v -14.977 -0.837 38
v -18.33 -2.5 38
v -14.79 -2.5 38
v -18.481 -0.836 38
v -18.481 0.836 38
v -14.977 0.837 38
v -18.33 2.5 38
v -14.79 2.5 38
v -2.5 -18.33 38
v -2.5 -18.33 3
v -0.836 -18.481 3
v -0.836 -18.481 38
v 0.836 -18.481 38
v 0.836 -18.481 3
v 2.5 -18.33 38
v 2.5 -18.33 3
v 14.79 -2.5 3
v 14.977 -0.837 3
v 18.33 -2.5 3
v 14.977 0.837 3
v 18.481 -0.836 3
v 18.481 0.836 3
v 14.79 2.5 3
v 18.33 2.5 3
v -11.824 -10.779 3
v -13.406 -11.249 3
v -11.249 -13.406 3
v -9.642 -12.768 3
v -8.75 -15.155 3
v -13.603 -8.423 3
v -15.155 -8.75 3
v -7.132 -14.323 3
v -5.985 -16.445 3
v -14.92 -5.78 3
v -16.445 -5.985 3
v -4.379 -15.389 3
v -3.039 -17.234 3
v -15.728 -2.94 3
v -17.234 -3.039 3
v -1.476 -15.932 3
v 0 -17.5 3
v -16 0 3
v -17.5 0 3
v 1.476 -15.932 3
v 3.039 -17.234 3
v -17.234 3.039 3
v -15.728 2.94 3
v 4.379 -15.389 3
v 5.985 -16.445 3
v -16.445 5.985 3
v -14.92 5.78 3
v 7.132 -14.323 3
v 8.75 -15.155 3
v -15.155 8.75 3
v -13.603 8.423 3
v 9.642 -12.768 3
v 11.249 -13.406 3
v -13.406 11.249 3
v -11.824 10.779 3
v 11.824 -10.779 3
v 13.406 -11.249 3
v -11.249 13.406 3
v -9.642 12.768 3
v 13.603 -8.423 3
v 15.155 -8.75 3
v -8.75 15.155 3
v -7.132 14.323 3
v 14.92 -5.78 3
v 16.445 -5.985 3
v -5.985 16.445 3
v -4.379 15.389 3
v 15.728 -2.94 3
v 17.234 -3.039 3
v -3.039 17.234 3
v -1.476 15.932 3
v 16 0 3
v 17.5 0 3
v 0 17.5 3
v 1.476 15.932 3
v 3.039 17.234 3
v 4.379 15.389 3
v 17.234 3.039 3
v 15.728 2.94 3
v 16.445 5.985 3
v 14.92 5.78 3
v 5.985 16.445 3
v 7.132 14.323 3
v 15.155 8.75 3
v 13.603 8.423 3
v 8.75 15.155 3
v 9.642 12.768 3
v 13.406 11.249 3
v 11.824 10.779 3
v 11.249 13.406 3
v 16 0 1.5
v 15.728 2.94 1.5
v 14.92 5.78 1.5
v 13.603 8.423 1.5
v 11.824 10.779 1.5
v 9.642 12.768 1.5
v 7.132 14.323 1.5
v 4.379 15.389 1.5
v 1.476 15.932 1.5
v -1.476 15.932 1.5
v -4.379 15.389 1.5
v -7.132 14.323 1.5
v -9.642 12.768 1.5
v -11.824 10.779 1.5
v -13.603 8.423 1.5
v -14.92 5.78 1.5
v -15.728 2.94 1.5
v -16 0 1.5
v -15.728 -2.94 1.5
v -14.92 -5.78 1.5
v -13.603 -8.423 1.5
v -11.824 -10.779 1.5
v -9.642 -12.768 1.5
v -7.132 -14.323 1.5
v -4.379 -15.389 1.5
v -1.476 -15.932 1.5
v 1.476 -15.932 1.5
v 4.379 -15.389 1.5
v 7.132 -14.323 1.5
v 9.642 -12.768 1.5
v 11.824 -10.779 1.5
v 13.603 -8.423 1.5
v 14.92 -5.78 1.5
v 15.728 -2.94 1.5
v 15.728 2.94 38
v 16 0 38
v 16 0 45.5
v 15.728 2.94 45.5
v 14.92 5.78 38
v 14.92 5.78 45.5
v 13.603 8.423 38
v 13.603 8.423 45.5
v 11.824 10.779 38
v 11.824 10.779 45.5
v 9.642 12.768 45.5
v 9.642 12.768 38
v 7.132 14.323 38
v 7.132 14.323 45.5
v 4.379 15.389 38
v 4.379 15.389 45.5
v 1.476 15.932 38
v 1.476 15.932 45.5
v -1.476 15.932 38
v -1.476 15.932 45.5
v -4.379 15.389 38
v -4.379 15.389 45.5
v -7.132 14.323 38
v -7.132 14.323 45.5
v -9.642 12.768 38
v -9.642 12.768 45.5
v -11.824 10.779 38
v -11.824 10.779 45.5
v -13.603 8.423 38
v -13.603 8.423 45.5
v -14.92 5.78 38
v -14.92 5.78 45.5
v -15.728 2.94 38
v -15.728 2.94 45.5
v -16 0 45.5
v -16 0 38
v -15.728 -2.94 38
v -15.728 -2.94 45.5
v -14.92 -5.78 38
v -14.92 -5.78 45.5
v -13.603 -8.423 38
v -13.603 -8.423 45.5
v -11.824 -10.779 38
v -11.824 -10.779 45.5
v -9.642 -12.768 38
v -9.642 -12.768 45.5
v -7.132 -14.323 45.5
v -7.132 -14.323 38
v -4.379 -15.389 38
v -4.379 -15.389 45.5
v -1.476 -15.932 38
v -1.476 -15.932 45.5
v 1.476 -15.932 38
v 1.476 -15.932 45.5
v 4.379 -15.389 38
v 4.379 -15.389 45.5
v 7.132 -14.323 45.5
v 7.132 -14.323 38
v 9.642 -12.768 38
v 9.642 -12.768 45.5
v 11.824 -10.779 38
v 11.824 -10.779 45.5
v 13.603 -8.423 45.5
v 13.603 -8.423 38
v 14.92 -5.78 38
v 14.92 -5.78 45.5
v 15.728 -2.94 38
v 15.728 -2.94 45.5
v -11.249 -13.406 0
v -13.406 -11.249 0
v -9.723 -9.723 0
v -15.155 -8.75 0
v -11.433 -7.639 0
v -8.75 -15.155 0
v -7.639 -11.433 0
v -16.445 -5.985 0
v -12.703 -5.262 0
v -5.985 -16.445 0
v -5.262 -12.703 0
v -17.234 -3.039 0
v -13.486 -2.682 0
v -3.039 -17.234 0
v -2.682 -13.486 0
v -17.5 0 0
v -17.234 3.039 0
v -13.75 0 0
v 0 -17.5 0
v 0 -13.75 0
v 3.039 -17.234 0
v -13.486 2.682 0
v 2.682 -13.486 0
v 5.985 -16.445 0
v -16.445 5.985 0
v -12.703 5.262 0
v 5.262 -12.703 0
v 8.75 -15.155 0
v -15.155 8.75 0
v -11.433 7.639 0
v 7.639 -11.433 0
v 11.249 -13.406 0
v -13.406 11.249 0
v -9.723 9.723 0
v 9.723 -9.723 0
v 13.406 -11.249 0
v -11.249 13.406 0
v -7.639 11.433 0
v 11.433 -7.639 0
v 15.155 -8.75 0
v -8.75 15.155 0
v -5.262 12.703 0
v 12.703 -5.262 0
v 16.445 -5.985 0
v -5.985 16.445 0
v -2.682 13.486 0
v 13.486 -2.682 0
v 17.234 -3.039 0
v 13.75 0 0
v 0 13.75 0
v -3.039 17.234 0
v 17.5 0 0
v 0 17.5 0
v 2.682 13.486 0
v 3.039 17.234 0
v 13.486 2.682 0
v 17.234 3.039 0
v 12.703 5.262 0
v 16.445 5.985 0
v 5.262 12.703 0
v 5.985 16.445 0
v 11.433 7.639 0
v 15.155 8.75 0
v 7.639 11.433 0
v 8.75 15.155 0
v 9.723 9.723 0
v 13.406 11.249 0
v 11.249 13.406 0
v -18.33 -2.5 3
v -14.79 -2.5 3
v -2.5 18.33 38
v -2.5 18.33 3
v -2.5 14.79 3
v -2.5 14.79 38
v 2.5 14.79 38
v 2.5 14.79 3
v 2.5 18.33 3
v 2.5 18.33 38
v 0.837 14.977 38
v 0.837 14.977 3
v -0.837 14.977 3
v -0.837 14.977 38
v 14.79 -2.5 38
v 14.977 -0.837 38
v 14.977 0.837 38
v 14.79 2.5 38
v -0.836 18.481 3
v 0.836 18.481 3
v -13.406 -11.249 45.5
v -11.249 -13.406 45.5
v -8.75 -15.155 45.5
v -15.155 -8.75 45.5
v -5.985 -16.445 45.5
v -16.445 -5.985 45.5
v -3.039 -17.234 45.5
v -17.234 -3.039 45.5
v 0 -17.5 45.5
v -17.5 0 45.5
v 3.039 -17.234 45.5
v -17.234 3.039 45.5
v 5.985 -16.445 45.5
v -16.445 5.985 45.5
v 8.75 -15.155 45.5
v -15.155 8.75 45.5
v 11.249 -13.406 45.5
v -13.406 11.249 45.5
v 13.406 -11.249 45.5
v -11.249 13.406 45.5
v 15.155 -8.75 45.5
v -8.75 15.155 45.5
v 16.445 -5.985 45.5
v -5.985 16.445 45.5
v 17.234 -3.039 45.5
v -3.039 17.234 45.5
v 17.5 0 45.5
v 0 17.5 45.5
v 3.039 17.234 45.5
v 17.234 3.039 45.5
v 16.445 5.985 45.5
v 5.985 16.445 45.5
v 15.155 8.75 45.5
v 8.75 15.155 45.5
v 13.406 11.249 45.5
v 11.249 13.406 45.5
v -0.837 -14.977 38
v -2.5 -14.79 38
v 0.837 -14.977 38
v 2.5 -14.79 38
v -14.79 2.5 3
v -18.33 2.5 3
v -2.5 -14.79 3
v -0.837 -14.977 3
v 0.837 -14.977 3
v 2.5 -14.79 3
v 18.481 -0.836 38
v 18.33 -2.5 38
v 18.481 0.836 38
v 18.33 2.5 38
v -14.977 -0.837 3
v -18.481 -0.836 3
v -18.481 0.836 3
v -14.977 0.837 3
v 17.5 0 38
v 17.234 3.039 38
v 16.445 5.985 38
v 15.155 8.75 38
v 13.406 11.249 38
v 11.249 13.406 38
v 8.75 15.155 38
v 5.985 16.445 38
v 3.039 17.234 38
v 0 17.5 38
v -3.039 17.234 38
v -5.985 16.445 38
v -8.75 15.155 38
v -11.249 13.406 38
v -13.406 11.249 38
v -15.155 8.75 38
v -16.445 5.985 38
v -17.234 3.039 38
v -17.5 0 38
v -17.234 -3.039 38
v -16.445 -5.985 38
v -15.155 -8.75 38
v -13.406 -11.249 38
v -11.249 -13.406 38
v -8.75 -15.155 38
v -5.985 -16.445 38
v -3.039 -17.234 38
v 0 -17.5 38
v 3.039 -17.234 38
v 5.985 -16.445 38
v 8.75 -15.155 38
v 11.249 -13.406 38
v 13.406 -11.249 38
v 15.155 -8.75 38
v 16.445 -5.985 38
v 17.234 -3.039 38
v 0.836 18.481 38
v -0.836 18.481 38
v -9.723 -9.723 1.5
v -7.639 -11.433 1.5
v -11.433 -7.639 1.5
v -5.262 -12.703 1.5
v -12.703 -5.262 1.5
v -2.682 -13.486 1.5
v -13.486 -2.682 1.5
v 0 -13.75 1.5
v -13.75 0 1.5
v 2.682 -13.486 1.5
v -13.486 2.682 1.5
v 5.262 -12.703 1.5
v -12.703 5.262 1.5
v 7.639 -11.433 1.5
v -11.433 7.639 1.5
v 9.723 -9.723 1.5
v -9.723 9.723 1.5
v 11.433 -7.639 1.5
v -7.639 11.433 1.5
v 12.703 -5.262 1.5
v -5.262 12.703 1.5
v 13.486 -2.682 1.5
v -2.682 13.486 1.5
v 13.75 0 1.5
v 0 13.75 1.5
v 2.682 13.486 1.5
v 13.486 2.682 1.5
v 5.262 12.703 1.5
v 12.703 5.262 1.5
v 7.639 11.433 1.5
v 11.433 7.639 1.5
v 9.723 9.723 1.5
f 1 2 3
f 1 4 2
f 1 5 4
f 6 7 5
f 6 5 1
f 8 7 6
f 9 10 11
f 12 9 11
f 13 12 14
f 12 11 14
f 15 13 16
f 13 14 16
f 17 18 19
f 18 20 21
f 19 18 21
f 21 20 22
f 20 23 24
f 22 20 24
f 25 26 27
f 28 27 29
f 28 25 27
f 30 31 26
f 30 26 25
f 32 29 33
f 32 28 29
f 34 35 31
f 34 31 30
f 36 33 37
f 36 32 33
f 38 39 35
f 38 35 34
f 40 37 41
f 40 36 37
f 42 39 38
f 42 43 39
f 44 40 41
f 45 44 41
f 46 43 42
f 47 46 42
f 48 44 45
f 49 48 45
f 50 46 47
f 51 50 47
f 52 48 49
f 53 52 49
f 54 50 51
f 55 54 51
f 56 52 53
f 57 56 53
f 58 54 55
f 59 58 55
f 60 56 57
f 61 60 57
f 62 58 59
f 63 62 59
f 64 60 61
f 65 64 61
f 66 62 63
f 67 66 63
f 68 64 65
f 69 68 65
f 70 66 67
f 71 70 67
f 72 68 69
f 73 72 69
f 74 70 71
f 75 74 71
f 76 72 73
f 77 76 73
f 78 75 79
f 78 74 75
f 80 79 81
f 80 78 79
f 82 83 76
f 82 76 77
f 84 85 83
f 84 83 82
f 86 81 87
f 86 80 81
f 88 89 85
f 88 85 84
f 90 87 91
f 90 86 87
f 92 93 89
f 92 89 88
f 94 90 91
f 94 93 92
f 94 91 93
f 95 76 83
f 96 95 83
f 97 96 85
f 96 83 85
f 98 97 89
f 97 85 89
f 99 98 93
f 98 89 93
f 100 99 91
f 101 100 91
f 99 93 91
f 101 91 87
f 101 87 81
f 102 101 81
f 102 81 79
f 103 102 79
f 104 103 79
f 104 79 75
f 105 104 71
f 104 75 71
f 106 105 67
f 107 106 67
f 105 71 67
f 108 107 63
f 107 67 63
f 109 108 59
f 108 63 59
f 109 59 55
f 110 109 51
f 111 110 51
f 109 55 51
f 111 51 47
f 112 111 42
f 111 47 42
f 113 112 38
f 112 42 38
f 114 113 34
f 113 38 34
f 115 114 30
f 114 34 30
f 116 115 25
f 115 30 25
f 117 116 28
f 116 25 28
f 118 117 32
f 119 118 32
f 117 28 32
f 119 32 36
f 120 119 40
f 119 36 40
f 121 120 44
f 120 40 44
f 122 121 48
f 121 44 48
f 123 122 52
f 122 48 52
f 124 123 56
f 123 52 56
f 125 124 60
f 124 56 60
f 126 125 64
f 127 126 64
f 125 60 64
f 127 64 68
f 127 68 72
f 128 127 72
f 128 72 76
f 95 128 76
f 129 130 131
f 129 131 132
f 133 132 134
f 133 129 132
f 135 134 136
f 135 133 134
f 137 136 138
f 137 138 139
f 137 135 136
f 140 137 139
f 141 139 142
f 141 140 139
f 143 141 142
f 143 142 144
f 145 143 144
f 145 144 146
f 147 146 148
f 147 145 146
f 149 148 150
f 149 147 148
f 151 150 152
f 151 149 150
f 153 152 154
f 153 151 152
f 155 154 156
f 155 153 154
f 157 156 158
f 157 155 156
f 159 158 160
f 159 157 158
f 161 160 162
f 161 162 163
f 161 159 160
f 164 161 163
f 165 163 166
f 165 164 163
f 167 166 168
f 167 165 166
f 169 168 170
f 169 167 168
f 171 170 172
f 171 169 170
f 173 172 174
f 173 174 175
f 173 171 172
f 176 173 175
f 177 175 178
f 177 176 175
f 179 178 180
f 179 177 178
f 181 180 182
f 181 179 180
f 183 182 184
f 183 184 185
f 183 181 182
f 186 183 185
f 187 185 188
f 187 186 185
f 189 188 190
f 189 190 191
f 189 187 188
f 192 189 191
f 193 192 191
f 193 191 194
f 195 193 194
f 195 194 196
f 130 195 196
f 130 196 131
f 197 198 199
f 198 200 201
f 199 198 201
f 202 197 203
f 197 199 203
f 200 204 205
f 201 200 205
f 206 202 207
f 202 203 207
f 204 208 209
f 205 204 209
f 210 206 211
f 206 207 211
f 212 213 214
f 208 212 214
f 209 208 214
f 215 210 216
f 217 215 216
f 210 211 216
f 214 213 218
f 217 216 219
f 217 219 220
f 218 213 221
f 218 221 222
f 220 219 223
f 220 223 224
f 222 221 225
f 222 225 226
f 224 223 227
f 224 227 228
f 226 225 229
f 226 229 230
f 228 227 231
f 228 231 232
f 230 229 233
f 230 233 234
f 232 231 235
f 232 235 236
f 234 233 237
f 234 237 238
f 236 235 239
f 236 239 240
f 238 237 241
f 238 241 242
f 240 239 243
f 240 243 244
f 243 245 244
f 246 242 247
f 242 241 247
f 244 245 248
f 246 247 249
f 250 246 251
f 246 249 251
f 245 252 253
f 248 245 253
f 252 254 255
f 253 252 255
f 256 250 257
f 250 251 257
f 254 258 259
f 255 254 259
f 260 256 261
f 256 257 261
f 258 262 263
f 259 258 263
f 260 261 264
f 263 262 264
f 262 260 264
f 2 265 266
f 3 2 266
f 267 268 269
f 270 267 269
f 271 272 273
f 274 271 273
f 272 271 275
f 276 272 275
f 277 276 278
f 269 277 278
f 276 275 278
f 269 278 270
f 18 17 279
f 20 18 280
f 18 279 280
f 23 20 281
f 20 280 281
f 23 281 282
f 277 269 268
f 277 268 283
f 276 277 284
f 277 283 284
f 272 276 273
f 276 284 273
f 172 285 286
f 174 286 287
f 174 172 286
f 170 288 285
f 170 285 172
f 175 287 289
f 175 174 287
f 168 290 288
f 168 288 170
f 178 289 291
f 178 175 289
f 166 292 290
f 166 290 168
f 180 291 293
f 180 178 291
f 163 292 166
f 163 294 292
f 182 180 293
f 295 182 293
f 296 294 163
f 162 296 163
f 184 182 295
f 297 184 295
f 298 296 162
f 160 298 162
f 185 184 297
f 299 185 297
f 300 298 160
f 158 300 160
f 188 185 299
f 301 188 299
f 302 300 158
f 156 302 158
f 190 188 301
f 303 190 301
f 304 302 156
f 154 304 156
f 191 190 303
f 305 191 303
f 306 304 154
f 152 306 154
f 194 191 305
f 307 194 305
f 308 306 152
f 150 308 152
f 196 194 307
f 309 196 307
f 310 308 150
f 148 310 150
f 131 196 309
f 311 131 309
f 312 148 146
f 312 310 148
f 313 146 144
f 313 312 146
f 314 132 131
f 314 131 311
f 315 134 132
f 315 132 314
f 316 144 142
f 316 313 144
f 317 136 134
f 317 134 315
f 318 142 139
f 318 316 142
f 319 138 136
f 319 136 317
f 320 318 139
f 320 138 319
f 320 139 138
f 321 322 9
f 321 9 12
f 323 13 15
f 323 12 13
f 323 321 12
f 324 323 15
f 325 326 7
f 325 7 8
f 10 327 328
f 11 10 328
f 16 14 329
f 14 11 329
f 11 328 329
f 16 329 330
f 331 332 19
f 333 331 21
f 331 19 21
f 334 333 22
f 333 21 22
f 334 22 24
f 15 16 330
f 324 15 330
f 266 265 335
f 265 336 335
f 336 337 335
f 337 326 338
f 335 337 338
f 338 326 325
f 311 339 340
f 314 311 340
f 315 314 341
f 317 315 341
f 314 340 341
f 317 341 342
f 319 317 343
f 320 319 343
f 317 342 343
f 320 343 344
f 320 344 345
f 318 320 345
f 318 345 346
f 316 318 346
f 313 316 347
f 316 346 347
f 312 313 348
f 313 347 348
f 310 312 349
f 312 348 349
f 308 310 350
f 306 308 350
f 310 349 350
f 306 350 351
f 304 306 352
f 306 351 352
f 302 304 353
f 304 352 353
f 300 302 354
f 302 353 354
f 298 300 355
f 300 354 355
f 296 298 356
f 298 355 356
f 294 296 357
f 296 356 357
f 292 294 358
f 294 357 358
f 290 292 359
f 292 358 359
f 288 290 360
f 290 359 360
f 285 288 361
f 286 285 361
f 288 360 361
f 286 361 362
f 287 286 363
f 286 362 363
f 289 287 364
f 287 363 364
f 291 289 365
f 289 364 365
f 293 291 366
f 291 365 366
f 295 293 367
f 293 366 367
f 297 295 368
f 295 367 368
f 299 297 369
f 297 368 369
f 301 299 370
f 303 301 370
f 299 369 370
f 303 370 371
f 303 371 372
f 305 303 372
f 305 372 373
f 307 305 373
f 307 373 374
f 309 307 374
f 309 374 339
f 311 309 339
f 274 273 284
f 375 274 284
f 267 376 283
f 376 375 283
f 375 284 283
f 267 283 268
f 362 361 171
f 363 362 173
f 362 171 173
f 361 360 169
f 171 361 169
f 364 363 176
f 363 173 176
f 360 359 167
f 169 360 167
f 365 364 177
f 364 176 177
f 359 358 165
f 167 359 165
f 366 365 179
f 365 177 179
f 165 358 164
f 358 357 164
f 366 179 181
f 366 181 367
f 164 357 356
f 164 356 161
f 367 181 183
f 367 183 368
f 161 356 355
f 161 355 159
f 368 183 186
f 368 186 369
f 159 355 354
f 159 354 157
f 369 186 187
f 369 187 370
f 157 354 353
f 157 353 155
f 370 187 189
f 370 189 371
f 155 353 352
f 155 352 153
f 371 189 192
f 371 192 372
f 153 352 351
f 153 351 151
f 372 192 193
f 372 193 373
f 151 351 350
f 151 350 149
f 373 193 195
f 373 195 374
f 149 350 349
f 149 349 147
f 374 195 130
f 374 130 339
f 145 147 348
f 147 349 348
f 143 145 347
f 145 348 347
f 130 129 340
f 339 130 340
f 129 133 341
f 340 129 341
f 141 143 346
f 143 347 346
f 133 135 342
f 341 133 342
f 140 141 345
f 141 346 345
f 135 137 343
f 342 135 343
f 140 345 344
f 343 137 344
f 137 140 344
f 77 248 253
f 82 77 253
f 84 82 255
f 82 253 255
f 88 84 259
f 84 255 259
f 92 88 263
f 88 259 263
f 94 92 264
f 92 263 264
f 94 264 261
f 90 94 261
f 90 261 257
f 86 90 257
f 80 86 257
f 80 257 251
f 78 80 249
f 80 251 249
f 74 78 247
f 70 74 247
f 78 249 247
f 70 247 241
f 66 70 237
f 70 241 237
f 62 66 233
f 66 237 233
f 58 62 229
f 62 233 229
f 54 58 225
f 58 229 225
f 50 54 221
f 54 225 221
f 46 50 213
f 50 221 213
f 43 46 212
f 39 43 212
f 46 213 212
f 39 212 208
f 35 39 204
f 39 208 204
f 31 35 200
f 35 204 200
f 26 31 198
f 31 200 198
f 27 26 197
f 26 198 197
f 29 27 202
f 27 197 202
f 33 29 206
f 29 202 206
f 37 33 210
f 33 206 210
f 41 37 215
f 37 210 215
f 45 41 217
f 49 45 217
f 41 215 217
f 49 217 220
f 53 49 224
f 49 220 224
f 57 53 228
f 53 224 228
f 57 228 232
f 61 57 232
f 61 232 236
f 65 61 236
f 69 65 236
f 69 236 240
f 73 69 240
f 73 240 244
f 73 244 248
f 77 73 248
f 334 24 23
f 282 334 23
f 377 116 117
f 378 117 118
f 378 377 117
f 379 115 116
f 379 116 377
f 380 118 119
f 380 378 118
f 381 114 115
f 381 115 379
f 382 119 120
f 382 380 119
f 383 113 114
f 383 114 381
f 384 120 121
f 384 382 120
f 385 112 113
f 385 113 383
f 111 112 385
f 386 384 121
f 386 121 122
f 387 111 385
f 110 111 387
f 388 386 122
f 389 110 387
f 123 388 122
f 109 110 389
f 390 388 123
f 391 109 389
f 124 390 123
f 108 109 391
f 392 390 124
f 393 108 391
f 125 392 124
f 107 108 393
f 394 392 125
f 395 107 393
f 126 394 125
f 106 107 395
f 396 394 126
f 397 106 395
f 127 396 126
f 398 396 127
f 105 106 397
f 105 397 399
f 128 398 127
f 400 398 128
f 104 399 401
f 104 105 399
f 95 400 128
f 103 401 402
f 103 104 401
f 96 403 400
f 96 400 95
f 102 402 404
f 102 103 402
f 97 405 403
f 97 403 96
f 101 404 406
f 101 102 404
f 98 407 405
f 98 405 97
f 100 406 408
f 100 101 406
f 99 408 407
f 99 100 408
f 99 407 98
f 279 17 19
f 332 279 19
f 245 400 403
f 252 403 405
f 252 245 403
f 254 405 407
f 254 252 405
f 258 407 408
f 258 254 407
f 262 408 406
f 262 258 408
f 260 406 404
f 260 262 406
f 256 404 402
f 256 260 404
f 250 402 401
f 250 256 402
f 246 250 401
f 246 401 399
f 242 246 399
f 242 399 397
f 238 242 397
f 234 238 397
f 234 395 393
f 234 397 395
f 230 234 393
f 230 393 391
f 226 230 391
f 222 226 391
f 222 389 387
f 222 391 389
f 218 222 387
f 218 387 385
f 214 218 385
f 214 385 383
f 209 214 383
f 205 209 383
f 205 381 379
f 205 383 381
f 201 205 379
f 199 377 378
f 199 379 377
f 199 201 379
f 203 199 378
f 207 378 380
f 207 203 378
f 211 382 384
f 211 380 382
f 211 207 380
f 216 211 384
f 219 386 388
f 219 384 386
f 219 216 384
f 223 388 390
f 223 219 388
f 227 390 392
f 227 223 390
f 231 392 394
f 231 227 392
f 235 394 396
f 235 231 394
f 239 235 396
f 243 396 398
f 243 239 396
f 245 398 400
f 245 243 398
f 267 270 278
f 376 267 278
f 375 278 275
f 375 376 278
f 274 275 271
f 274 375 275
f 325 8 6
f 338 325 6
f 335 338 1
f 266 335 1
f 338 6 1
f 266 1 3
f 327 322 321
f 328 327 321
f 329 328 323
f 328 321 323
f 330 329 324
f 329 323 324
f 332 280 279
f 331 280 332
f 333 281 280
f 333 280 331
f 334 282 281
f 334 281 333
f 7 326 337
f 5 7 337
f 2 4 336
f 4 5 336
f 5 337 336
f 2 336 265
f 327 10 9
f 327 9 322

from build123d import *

# Parameters (mm, degrees)
F0_R      = 18.5
F0_R_2    = 13.75
F1_DEPTH  = 43
F2_R      = 15
F2_R_2    = 13.75
F3_DEPTH  = 41.5
F5_W      = 34.3430949748
F5_H      = 5
F5_W_2    = 5
F5_H_2    = 31.6730713844
F6_DEPTH  = 35
F7_R      = 17.5
F7_R_2    = 13.75
F8_DEPTH  = 3
F10_R     = 17.5
F10_R_2   = 16
F11_DEPTH = 7.5
F12_R     = 16
F13_DEPTH = 1.5


# Not quite as in the source:
# - a feature names something its author has since deleted; it is built from what else it names


with BuildPart() as f1:
    # F0 (on Top) → F1 (new body)
    with BuildSketch(Plane.XY):
        Circle(F0_R)
        Circle(F0_R_2, mode=Mode.SUBTRACT)
    extrude(amount=F1_DEPTH)

    # F2 (on face) → F3 (cut)
    with BuildSketch(Plane.XY.offset(43)):
        Circle(F2_R)
        Circle(F2_R_2, mode=Mode.SUBTRACT)
    extrude(amount=-F3_DEPTH, mode=Mode.SUBTRACT)

    # F5 (on offset) → F6 (intersect)
    with BuildSketch(Plane.XY.offset(3)):
        with Locations((19.6715474874, 0)):
            Rectangle(F5_W, F5_H)
        Rectangle(F5_W_2, F5_H)
        with Locations((0, 18.3365356922)):
            Rectangle(F5_W_2, F5_H_2)
        with Locations((-19.6715474874, 0)):
            Rectangle(F5_W, F5_H)
        with Locations((0, -18.3365356922)):
            Rectangle(F5_W_2, F5_H_2)
    extrude(amount=F6_DEPTH, mode=Mode.INTERSECT)


with BuildPart() as f8:
    # F7 (on Top) → F8 (new body)
    with BuildSketch(Plane.XY):
        Circle(F7_R)
        Circle(F7_R_2, mode=Mode.SUBTRACT)
    extrude(amount=F8_DEPTH)

    # F12 (on face) → F13 (cut)
    with BuildSketch(Plane.XY.offset(3)):
        Circle(F12_R)
    extrude(amount=-F13_DEPTH, mode=Mode.SUBTRACT)


with BuildPart() as f11:
    # F10 (on offset) → F11 (new body)
    with BuildSketch(Plane.XY.offset(38)):
        Circle(F10_R)
        Circle(F10_R_2, mode=Mode.SUBTRACT)
    extrude(amount=F11_DEPTH)


solid = Compound([f1.part, f8.part, f11.part])
